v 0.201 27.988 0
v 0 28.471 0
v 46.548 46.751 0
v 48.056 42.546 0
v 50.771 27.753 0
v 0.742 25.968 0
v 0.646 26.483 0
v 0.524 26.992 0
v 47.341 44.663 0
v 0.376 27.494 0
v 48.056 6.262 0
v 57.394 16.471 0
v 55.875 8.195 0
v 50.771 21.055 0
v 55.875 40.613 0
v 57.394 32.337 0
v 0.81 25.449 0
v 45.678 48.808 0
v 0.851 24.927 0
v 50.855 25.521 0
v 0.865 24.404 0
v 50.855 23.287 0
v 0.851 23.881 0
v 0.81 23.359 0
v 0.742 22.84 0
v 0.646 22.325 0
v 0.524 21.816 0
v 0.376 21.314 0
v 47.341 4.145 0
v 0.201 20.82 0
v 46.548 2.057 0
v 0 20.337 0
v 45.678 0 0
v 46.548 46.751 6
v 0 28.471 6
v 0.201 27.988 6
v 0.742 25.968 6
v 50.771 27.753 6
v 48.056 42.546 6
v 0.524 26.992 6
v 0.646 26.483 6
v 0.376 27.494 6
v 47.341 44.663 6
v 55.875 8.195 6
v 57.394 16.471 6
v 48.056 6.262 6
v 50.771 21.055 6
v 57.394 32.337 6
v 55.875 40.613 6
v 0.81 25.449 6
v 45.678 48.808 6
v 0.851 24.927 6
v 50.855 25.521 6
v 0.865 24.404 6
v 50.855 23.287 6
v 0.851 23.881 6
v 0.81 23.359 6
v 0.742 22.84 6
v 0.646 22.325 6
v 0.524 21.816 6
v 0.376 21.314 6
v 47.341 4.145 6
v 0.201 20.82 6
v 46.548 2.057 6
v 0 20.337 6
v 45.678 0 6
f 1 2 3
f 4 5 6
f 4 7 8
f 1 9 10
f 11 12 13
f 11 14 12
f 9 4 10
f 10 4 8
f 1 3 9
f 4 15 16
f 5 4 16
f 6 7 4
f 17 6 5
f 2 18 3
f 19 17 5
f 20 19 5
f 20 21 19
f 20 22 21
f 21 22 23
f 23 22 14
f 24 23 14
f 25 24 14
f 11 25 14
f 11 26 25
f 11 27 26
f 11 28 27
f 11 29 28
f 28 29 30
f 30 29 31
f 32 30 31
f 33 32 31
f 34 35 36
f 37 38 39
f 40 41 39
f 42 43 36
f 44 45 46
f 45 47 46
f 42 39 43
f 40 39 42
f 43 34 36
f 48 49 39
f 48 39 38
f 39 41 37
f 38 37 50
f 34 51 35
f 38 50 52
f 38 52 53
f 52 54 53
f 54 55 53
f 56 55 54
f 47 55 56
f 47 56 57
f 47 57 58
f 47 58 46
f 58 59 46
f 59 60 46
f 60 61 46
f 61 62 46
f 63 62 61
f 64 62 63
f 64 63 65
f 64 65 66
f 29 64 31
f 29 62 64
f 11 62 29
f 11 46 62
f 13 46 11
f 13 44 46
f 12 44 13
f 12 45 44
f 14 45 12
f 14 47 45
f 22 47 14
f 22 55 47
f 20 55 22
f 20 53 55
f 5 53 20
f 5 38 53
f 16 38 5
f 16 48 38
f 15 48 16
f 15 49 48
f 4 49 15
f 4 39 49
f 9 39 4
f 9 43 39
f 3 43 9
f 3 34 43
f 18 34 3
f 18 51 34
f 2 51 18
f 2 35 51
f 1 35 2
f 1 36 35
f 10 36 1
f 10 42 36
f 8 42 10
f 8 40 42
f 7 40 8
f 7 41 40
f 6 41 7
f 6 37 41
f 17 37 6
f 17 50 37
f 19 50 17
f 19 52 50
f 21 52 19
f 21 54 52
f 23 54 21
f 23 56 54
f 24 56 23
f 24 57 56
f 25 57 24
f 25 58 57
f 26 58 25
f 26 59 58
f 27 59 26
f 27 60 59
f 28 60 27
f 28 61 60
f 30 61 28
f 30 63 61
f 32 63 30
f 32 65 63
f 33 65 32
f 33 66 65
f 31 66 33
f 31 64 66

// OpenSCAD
$fn = 32;

// ----------------------------------------------------------------------
// Gear sector: 2 teeth on 48 degrees
// ----------------------------------------------------------------------

// --- parameters (mm) ---
sector_angle = 48;        // sector angle, degrees
root_r = 60;              // root circle radius
tooth_h = 7;              // tooth height over the root circle
teeth = 2;                // number of teeth on the sector
hub_r = 10;               // hub bore radius
plate_t = 6;              // sector thickness, Z
arc_step = 3;             // sampling step of the root/hub arcs, degrees

tip_r = root_r + tooth_h;  // tip circle radius

profile = [[45.678, 0], [46.548, 2.057], [47.341, 4.145], [48.056, 6.262], [55.875, 8.195], [57.394, 16.471], [50.771, 21.055], [50.855, 23.287], [50.855, 25.521], [50.771, 27.753], [57.394, 32.337], [55.875, 40.613], [48.056, 42.546], [47.341, 44.663], [46.548, 46.751], [45.678, 48.808], [0, 28.471], [0.201, 27.988], [0.376, 27.494], [0.524, 26.992], [0.646, 26.483], [0.742, 25.968], [0.81, 25.449], [0.851, 24.927], [0.865, 24.404], [0.851, 23.881], [0.81, 23.359], [0.742, 22.84], [0.646, 22.325], [0.524, 21.816], [0.376, 21.314], [0.201, 20.82], [0, 20.337]];  // primary outline, 33 points, counter clockwise

// --- the one profile operation ---
linear_extrude(height = plate_t) polygon(points = profile);
